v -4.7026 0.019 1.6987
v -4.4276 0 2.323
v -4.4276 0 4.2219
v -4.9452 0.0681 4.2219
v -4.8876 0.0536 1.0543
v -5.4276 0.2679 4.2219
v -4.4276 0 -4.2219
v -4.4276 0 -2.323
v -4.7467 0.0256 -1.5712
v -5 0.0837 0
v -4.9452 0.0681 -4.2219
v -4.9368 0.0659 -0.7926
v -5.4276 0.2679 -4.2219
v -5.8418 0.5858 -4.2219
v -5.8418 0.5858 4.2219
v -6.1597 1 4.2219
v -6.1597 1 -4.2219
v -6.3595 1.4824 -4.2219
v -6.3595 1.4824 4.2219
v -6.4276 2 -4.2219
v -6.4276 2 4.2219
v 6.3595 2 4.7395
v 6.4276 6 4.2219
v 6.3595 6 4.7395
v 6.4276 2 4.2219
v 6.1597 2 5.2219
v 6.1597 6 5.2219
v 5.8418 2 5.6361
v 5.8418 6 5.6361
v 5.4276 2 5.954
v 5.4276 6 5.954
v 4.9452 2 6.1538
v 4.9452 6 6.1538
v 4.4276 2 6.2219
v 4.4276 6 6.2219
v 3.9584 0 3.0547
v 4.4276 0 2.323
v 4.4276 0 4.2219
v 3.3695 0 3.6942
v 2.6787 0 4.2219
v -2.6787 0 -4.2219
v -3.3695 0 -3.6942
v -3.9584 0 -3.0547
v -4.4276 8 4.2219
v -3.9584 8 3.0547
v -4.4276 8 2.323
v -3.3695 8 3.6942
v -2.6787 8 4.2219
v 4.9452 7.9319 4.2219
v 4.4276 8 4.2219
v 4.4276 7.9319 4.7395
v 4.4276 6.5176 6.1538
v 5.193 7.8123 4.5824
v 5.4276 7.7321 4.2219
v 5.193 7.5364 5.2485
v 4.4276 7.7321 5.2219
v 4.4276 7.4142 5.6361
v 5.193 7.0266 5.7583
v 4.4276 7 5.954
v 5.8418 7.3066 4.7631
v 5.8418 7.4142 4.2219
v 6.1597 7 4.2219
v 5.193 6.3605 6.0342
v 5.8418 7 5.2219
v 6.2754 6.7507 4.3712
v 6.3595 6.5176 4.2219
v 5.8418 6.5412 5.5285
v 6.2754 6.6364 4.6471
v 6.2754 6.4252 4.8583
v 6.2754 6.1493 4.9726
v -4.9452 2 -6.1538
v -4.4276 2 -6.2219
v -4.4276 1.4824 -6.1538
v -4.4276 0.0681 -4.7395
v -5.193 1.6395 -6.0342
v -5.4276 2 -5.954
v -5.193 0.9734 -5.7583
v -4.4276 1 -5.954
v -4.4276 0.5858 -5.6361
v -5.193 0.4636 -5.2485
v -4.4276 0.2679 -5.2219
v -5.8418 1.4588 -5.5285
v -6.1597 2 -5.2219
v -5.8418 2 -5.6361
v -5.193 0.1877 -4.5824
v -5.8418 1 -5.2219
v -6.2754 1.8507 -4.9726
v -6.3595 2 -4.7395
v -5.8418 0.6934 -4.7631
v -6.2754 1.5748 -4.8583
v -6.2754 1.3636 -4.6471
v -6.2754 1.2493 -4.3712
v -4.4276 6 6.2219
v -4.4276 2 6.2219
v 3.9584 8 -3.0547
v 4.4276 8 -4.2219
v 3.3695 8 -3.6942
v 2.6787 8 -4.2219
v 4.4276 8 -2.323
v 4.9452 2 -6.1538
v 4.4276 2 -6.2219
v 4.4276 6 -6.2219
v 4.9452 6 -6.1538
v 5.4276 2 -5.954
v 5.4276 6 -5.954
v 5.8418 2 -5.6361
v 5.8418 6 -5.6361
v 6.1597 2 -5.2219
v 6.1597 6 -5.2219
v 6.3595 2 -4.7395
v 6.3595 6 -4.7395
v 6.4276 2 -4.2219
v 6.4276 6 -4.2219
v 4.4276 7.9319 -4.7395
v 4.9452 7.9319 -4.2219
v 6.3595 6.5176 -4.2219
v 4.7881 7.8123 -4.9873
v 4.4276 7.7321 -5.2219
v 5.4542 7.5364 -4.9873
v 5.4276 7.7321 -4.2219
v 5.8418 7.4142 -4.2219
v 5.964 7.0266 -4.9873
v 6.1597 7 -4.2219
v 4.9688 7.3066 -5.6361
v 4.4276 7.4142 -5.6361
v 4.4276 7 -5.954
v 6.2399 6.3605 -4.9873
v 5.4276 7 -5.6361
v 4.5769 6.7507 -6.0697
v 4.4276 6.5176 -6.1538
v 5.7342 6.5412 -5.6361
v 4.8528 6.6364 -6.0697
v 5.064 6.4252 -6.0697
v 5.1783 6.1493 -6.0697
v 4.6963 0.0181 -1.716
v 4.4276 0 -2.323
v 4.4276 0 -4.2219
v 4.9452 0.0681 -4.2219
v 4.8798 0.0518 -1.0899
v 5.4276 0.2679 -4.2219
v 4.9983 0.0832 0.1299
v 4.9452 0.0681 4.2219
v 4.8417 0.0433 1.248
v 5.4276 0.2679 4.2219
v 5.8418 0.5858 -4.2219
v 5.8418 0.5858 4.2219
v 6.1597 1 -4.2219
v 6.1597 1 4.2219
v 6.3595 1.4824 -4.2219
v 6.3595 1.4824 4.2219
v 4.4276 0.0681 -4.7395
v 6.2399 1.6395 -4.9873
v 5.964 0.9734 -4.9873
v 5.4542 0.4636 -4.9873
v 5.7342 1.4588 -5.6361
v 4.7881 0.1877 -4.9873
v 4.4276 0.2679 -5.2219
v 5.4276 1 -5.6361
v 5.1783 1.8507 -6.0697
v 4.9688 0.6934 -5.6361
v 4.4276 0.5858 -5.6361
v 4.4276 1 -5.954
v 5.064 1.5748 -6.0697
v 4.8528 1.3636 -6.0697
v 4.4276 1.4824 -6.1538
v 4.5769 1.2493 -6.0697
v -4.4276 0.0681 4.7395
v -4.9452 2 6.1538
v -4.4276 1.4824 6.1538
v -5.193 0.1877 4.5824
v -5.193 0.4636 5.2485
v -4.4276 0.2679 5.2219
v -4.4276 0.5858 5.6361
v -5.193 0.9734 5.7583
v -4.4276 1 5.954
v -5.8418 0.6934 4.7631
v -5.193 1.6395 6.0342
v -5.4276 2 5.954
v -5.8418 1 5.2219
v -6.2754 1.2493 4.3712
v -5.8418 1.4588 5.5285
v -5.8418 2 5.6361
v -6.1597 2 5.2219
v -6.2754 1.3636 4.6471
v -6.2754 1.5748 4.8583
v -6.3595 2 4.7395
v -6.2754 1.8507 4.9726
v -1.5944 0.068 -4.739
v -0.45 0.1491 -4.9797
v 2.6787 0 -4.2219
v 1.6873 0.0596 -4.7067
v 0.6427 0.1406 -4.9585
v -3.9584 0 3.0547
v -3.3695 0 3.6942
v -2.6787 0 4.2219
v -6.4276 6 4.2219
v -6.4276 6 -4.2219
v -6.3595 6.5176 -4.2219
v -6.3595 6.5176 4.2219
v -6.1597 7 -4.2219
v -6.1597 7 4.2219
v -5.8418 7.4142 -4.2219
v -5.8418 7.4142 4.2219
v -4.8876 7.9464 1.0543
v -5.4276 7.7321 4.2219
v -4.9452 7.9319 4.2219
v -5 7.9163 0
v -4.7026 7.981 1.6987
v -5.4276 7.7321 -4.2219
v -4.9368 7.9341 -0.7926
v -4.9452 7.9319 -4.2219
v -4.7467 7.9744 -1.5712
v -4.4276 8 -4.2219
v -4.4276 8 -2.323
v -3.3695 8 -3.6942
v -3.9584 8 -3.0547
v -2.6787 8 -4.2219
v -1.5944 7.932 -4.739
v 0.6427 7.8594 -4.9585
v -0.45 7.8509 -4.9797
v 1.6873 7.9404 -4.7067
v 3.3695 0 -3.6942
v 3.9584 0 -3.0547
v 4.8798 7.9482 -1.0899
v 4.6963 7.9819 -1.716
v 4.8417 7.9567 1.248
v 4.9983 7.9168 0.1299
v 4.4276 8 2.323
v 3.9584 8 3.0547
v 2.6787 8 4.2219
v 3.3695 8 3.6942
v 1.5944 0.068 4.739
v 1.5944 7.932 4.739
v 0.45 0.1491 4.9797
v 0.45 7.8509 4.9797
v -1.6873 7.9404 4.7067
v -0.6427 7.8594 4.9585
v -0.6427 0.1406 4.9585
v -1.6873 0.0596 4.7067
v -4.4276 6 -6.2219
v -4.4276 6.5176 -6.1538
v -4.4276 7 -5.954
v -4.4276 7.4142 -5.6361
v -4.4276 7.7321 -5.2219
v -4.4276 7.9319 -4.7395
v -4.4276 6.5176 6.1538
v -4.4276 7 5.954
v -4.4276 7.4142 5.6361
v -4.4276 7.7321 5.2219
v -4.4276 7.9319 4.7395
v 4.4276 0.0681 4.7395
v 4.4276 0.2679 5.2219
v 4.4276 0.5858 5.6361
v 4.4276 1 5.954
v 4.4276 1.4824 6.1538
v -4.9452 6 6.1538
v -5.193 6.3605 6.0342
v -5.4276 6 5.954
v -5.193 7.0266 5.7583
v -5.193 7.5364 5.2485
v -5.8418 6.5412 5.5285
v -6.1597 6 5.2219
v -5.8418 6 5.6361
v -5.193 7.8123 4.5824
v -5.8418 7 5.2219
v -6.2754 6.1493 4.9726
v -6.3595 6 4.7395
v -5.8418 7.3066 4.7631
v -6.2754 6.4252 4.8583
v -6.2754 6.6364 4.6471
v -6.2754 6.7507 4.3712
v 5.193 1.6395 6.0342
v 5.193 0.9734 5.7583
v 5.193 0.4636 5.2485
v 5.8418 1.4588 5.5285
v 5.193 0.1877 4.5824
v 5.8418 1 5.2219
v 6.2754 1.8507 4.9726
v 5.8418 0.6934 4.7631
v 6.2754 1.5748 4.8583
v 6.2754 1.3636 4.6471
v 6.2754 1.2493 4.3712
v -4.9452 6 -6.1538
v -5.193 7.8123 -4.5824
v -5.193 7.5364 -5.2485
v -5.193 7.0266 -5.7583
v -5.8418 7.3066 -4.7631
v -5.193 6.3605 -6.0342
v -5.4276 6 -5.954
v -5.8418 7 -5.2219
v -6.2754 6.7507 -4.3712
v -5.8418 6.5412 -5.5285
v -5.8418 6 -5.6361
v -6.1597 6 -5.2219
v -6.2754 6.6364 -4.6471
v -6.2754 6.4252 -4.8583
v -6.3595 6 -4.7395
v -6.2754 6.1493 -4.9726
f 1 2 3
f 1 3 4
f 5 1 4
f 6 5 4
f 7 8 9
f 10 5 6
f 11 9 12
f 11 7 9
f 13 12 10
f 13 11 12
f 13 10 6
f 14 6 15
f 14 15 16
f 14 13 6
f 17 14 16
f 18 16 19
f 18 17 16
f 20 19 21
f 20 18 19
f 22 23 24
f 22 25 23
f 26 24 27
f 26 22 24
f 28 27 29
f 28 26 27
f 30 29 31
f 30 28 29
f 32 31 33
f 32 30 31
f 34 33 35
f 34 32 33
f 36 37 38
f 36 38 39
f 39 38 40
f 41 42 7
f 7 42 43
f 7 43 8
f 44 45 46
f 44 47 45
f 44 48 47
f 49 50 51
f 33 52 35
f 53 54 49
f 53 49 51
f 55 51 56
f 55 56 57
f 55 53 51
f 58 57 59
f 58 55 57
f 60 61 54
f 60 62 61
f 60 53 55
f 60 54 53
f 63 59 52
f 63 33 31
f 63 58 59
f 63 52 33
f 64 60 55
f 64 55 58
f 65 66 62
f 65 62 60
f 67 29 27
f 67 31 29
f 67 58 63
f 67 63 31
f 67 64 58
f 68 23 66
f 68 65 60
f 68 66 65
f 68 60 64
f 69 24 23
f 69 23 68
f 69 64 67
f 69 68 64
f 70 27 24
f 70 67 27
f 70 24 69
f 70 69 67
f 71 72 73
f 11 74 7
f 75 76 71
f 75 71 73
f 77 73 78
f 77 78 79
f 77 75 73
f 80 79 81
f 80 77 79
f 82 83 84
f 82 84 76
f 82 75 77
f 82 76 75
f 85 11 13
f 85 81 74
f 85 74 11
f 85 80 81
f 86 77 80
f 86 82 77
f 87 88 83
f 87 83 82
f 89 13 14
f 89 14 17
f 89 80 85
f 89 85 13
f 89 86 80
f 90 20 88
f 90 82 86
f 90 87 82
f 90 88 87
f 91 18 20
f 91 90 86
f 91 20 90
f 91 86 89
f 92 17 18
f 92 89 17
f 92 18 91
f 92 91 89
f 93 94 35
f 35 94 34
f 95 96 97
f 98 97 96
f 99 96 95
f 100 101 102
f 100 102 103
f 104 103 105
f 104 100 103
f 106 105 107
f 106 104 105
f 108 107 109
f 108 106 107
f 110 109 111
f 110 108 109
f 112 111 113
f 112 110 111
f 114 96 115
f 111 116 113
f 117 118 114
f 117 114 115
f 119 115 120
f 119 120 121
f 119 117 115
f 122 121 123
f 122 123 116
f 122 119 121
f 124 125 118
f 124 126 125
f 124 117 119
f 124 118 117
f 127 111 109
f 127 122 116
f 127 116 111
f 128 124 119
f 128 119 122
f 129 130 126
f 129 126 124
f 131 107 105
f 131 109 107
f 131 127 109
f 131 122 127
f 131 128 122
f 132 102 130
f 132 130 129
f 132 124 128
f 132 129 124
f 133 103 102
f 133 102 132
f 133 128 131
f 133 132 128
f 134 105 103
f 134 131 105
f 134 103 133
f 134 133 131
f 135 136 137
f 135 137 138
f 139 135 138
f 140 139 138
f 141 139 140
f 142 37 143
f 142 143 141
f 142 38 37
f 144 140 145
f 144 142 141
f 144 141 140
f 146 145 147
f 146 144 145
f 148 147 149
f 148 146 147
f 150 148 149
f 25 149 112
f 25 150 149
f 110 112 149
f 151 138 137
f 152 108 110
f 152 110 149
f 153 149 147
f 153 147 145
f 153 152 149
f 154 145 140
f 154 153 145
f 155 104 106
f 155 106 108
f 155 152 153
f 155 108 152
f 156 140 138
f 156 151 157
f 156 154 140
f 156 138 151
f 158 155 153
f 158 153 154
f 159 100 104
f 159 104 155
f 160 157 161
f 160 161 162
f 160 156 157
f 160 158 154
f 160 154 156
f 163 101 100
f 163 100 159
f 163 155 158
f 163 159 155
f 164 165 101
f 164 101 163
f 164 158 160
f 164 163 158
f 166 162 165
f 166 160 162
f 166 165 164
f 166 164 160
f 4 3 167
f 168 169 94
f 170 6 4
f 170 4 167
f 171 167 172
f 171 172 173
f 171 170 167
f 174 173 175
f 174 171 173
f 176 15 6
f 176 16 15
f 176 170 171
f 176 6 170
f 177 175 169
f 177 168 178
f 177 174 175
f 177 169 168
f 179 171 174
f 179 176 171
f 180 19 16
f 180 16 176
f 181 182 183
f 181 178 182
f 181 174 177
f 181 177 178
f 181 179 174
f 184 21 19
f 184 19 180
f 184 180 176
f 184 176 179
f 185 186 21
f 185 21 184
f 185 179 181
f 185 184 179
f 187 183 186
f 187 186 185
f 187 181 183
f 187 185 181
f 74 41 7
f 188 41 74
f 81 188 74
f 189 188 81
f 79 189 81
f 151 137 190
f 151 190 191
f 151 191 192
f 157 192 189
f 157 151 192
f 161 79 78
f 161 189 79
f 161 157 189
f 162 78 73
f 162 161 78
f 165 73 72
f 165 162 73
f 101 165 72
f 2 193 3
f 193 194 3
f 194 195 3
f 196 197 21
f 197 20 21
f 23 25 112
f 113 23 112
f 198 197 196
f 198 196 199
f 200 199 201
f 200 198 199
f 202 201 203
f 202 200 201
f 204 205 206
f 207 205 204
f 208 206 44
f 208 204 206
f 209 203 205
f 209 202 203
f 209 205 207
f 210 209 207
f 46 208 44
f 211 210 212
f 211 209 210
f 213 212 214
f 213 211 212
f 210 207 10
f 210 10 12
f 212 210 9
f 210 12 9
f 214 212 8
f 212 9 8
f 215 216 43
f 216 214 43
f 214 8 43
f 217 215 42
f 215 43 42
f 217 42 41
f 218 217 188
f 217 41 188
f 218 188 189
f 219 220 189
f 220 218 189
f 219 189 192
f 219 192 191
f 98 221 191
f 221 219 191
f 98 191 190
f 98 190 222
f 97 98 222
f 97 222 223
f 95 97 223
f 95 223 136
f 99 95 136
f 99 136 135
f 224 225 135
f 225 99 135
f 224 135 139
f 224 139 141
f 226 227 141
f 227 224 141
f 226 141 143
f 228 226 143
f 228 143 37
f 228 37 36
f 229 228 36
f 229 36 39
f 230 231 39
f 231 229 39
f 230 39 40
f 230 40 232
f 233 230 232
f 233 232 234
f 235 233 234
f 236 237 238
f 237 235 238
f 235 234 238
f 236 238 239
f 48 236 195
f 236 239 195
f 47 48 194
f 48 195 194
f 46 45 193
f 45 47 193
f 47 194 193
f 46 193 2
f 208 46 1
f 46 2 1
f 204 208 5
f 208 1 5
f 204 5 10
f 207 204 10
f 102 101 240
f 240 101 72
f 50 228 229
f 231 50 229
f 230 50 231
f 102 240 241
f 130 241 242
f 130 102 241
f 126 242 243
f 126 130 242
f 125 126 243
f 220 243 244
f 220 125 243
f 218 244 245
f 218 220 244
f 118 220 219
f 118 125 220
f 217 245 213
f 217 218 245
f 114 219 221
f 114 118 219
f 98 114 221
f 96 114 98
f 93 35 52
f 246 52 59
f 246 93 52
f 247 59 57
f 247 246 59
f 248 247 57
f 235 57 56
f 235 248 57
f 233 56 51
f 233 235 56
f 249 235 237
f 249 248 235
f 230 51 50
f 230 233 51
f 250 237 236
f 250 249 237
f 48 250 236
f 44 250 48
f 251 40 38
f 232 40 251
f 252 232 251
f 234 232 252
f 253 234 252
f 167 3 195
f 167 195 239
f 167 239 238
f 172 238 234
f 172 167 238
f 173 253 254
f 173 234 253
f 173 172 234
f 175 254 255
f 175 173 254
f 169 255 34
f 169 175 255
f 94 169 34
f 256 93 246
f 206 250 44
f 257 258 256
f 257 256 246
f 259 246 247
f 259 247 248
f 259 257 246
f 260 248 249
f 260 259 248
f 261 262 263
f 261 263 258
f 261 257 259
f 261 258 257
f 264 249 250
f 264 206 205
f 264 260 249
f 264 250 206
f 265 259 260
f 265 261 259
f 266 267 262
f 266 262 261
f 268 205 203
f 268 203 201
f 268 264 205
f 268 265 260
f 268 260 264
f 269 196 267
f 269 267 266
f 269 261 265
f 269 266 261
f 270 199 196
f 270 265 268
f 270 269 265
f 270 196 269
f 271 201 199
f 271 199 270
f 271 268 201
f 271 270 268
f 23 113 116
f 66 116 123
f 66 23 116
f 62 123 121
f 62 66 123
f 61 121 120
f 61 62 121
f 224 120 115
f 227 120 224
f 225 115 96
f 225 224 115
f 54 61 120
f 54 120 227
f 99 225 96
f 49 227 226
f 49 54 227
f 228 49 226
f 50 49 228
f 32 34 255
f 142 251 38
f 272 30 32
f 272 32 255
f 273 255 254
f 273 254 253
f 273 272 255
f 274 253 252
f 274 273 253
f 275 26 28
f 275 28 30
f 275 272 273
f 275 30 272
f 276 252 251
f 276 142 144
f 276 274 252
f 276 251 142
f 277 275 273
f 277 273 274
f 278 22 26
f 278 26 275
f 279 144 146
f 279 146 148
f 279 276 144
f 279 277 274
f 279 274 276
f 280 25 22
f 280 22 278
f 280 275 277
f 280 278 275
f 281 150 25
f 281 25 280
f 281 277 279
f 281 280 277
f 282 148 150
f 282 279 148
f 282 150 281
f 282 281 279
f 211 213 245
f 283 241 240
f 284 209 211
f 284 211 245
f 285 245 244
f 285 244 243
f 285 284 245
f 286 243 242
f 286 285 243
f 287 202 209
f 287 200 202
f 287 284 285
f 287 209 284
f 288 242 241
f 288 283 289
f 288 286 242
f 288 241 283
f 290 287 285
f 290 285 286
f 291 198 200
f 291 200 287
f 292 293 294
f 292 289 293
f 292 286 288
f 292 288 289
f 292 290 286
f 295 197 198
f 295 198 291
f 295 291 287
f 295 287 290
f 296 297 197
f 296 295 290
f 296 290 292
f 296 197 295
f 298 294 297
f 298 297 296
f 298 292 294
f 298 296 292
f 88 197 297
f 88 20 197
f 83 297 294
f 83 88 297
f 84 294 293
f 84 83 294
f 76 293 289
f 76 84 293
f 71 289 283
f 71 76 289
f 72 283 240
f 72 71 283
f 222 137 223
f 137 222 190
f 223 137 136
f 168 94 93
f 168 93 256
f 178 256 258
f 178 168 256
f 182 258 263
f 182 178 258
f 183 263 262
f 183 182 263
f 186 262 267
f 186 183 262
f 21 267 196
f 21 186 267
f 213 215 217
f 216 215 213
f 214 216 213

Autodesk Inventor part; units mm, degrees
ref_plane "YZ Plane" through (0, 0, 0) normal (1, 0, 0) x (0, 1, 0)
ref_plane "XZ Plane" through (0, 0, 0) normal (0, 1, 0) x (-1, 0, 0)
ref_plane "XY Plane" through (0, 0, 0) normal (0, 0, 1) x (1, 0, 0)
sketch "Sketch1" plane through (0, 0, 0) normal (0, 1, 0) x (-1, 0, 0)
  circle A0 centre (0, 0) radius 5
  line L0 (6.4276, 6.2219) -> (-6.4276, 6.2219)
  line L1 (-6.4276, 6.2219) -> (-6.4276, -6.2219)
  line L2 (-6.4276, -6.2219) -> (6.4276, -6.2219)
  line L3 (6.4276, -6.2219) -> (6.4276, 6.2219)
  line L4 (6.4276, 6.2219) -> (-6.4276, -6.2219) construction
  line L5 (-6.4276, 6.2219) -> (6.4276, -6.2219) construction
  dimension "d0" = 10
extrude "Extrusion1" add sketch "Sketch1" along normal blind 8
fillet "Fillet1" radius 2 12 edges at (6.4276, 8, 0) (0, 8, -6.2219) (0, 8, 6.2219) (-6.4276, 8, 0) (-6.4276, 0, 0) (0, 0, 6.2219) (6.4276, 0, 0) (0, 0, -6.2219) (-6.4276, 4, -6.2219) (6.4276, 4, 6.2219) (6.4276, 4, -6.2219) (-6.4276, 4, 6.2219)
thread "Thread1" size "M10x1" class "6H" standard "ANSI Metric M Profile" full length
properties part number "benzcadnut"
